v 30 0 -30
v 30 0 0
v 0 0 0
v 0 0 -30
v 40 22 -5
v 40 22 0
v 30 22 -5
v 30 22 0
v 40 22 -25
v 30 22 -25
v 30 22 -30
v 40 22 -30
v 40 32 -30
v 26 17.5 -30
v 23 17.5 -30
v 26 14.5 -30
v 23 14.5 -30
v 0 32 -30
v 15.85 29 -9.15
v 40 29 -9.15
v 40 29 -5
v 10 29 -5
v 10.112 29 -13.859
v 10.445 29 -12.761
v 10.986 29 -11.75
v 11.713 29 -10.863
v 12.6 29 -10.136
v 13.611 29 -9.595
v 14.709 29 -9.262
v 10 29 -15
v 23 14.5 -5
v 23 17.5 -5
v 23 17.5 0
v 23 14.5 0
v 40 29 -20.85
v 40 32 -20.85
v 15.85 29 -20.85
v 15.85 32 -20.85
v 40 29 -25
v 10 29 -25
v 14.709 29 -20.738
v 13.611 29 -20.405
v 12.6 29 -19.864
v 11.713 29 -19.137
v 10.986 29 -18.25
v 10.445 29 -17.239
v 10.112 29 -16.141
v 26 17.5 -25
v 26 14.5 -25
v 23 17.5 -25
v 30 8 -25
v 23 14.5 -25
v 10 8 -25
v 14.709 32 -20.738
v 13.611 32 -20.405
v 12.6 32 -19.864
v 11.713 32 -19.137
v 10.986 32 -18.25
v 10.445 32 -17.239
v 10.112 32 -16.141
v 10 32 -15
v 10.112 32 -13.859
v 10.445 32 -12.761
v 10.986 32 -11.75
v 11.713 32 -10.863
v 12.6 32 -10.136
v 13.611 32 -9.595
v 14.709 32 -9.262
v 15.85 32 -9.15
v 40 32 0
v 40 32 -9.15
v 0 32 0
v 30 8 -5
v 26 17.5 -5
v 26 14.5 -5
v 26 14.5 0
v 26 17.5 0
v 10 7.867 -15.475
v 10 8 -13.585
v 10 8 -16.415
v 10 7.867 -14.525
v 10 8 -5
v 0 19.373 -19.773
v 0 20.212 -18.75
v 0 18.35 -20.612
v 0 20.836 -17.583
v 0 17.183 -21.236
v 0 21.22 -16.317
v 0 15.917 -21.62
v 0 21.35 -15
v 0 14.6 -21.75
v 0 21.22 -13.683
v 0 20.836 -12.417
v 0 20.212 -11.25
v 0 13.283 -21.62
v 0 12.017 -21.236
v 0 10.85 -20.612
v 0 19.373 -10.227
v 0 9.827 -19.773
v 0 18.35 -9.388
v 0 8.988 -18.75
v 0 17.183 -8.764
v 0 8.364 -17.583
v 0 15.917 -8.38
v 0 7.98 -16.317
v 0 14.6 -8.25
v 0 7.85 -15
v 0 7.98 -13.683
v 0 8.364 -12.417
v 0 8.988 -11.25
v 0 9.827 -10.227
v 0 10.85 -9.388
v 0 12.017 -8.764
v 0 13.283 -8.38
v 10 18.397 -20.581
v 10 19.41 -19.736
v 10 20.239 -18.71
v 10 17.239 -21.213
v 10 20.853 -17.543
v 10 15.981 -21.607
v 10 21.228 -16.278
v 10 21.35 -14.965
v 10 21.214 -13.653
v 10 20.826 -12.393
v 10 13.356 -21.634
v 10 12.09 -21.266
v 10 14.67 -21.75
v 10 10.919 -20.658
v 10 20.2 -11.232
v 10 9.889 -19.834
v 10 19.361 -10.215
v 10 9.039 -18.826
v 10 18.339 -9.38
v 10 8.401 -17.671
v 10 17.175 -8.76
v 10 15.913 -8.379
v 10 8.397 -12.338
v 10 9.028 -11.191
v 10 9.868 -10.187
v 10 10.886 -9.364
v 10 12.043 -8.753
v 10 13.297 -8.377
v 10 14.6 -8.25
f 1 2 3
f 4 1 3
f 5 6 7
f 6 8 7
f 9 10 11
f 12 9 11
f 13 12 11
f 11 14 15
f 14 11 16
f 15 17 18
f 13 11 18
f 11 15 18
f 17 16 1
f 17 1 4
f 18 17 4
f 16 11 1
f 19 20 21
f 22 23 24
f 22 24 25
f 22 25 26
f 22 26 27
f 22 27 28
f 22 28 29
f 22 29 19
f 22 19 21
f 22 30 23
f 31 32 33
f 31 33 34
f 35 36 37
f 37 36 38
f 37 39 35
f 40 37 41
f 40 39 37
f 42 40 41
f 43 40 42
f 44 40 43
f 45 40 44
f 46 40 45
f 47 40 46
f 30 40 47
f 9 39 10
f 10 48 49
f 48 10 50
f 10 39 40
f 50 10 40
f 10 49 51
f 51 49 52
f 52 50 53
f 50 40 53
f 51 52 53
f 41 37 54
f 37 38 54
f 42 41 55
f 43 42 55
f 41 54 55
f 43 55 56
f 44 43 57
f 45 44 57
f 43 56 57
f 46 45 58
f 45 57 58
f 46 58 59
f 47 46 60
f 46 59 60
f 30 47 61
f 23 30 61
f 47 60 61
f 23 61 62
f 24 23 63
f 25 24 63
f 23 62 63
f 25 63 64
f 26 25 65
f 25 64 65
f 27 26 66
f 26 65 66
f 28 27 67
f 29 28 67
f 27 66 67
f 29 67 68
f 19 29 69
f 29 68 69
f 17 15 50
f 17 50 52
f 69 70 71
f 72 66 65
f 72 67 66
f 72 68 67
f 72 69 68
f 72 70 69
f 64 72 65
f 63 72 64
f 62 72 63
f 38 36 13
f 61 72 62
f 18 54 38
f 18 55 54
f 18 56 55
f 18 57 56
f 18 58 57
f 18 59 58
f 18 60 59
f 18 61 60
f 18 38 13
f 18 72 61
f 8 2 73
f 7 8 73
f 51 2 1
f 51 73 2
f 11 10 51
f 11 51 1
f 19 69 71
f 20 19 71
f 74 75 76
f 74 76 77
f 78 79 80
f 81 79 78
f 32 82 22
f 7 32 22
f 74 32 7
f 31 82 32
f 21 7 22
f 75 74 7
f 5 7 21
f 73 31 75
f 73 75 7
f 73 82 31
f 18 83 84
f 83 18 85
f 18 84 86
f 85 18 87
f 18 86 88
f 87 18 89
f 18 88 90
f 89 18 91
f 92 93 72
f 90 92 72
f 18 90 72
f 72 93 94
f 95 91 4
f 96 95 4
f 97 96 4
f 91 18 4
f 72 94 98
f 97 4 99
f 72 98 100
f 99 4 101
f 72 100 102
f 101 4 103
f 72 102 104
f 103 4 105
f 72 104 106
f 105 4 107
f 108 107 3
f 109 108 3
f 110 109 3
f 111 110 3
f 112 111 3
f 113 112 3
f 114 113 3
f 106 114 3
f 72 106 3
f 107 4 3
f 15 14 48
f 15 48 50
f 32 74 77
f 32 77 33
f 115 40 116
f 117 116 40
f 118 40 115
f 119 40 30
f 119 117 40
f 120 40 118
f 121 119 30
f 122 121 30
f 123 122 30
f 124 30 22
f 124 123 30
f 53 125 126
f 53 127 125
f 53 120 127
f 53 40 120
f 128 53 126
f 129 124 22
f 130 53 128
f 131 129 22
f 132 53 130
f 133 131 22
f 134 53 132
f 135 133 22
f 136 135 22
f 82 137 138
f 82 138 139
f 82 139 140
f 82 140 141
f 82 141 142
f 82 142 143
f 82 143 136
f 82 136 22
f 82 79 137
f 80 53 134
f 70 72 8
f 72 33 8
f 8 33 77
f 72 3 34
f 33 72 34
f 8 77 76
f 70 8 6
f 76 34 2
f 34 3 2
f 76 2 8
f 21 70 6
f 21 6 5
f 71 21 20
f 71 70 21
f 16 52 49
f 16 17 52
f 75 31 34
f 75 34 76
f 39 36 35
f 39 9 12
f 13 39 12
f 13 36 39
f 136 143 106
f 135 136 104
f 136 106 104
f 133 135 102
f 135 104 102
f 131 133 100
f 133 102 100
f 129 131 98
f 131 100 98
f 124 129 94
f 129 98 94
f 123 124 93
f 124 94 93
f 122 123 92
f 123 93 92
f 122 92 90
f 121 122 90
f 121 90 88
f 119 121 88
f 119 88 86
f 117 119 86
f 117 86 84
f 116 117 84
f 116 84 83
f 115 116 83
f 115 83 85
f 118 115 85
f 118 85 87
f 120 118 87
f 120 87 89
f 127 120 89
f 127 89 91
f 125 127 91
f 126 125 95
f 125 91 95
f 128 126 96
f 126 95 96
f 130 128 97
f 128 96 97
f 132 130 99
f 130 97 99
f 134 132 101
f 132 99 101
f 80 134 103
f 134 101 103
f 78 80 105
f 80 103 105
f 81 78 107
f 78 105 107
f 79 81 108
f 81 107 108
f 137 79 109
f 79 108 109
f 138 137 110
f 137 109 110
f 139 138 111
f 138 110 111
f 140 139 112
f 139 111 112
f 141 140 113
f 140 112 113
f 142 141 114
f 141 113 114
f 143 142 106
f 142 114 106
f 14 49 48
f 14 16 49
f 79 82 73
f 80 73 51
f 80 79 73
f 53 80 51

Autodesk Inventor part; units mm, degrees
ref_plane "YZ Plane" through (0, 0, 0) normal (1, 0, 0) x (0, 1, 0)
ref_plane "XZ Plane" through (0, 0, 0) normal (0, 1, 0) x (-1, 0, 0)
ref_plane "XY Plane" through (0, 0, 0) normal (0, 0, 1) x (1, 0, 0)
sketch "스케치2" plane through (0, 0, 0) normal (0, 1, 0) x (-1, 0, 0)
  line L0 (0, 0) -> (-30, 0)
  line L1 (-30, 0) -> (-30, -30)
  line L2 (-30, -30) -> (0, -30)
  line L3 (0, -30) -> (0, 0)
  line L4 (-10, -5) -> (-30, -5)
  line L5 (-30, -5) -> (-30, -25)
  line L6 (-30, -25) -> (-10, -25)
  line L7 (-10, -25) -> (-10, -5)
  point P0 (0, -15)
  point P1 (-10, -15)
  dimension "d0" = 30
  dimension "d1" = 30
  dimension "d2" = 20
  dimension "d3" = 20
extrude "돌출1" add sketch "스케치2" along normal blind 32 contours L3 L2 L1 L6 L7 L4 L0
sketch "스케치3" plane through (0, 0, -30) normal (-1, 0, 0) x (0, 0, 1)
  circle A0 centre (15, 14.6) radius 6.75
  line L0 (0, 32) -> (30, 32)
  line L1 (30, 0) -> (30, 32)
  line L2 (0, 0) -> (30, 0) projected
  point P0 (15, 32)
  point P1 (30, 16)
  dimension "d6" = 13.5
  dimension "d34" = 14.6
extrude "돌출2" cut sketch "스케치3" against normal blind 20
sketch "스케치4" plane through (10, 0, -5) normal (1, 0, 0) x (0, 0, -1)
  line L0 (0, 32) -> (20, 32)
  line L1 (20, 32) -> (20, 29)
  line L2 (20, 29) -> (0, 29)
  line L3 (0, 29) -> (0, 32)
  line L4 (0, 32) -> (20, 32) projected
  circle A0 centre (10, 14.6) radius 6.75 projected
  line L5 (0, 0) -> (0, 32) projected
  point P0 (-5, 0)
  point P1 (10, 32)
  point P2 (10, 32)
  dimension "d10" = 3
  dimension "d11" = 17.4
extrude "돌출3" add sketch "스케치4" along normal up to surface (20 mm away) contours L0 L1 L2 L3
sketch "스케치6" plane through (0, 32, 0) normal (0, 1, 0) x (1, 0, 0)
  line L0 (15.85, 15) -> (69.8483, 15) construction
  line L1 (15.85, 9.15) -> (69.8483, 9.15)
  line L2 (69.8483, 20.85) -> (15.85, 20.85)
  arc A0 (15.85, 20.85) -> (15.85, 9.15) centre (15.85, 15) ccw
  arc A1 (69.8483, 9.15) -> (69.8483, 20.85) centre (69.8483, 15) ccw
  line L3 (30, 0) -> (30, 30) projected
  line L4 (0, 30) -> (0, 0) projected
  point P0 (42.8492, 15)
  point P1 (10, 15)
  point P2 (30, 15)
  point P3 (30, 9.15)
  point P4 (30, 20.85)
  dimension "d19" = 11.7
  dimension "d20" = 10
extrude "돌출5" cut sketch "스케치6" against normal blind 28 contours A0 L2 L3 L1
sketch "스케치7" plane through (10, 0, -5) normal (1, 0, 0) x (0, 0, -1)
  line L0 (0, 8) -> (20, 8)
  line L1 (20, 8) -> (20, 0)
  line L2 (20, 0) -> (0, 0)
  line L3 (0, 0) -> (0, 8)
  circle A0 centre (10, 14.6) radius 6.75 projected
  point P0 (-5, 0)
  dimension "d32" = 8
  dimension "d33" = 8
extrude "돌출6" add sketch "스케치7" along normal up to surface (20 mm away) contours L0 A0 L1 L2 L3 | L0 A0 picked at (10.1583, 7.9556)
sketch "스케치8" plane through (30, 0, -30) normal (0, 0, -1) x (-1, 0, 0)
  line L0 (30, 0) -> (30, 32) projected
  line L1 (4, 17.5) -> (7, 17.5)
  line L2 (7, 17.5) -> (7, 14.5)
  line L3 (7, 14.5) -> (4, 14.5)
  line L4 (4, 14.5) -> (4, 17.5)
  point P0 (7, 16)
  point P1 (30, 16)
  dimension "d27" = 23
  dimension "d28" = 3
  dimension "d29" = 3
extrude "돌출7" cut sketch "스케치8" against normal blind 40
sketch "스케치9" plane through (30, 0, 0) normal (1, 0, 0) x (0, 0, -1)
  line L0 (0, 32) -> (9.15, 32) projected
  line L1 (9.15, 29) -> (9.15, 32) projected
  line L2 (20.85, 32) -> (20.85, 29) projected
  line L3 (20.85, 32) -> (30, 32) projected
  line L4 (9.15, 29) -> (5, 29) projected
  line L5 (25, 29) -> (20.85, 29) projected
  line L6 (0, 32) -> (0, 22)
  line L7 (0, 0) -> (0, 32) projected
  line L8 (30, 32) -> (30, 22)
  line L9 (0, 22) -> (5, 22)
  line L10 (5, 22) -> (5, 29)
  line L11 (25, 29) -> (25, 22)
  line L12 (25, 22) -> (30, 22)
  dimension "d35" = 10
  dimension "d36" = 10
extrude "돌출8" add sketch "스케치9" along normal blind 10
properties part number "valve_mount"
